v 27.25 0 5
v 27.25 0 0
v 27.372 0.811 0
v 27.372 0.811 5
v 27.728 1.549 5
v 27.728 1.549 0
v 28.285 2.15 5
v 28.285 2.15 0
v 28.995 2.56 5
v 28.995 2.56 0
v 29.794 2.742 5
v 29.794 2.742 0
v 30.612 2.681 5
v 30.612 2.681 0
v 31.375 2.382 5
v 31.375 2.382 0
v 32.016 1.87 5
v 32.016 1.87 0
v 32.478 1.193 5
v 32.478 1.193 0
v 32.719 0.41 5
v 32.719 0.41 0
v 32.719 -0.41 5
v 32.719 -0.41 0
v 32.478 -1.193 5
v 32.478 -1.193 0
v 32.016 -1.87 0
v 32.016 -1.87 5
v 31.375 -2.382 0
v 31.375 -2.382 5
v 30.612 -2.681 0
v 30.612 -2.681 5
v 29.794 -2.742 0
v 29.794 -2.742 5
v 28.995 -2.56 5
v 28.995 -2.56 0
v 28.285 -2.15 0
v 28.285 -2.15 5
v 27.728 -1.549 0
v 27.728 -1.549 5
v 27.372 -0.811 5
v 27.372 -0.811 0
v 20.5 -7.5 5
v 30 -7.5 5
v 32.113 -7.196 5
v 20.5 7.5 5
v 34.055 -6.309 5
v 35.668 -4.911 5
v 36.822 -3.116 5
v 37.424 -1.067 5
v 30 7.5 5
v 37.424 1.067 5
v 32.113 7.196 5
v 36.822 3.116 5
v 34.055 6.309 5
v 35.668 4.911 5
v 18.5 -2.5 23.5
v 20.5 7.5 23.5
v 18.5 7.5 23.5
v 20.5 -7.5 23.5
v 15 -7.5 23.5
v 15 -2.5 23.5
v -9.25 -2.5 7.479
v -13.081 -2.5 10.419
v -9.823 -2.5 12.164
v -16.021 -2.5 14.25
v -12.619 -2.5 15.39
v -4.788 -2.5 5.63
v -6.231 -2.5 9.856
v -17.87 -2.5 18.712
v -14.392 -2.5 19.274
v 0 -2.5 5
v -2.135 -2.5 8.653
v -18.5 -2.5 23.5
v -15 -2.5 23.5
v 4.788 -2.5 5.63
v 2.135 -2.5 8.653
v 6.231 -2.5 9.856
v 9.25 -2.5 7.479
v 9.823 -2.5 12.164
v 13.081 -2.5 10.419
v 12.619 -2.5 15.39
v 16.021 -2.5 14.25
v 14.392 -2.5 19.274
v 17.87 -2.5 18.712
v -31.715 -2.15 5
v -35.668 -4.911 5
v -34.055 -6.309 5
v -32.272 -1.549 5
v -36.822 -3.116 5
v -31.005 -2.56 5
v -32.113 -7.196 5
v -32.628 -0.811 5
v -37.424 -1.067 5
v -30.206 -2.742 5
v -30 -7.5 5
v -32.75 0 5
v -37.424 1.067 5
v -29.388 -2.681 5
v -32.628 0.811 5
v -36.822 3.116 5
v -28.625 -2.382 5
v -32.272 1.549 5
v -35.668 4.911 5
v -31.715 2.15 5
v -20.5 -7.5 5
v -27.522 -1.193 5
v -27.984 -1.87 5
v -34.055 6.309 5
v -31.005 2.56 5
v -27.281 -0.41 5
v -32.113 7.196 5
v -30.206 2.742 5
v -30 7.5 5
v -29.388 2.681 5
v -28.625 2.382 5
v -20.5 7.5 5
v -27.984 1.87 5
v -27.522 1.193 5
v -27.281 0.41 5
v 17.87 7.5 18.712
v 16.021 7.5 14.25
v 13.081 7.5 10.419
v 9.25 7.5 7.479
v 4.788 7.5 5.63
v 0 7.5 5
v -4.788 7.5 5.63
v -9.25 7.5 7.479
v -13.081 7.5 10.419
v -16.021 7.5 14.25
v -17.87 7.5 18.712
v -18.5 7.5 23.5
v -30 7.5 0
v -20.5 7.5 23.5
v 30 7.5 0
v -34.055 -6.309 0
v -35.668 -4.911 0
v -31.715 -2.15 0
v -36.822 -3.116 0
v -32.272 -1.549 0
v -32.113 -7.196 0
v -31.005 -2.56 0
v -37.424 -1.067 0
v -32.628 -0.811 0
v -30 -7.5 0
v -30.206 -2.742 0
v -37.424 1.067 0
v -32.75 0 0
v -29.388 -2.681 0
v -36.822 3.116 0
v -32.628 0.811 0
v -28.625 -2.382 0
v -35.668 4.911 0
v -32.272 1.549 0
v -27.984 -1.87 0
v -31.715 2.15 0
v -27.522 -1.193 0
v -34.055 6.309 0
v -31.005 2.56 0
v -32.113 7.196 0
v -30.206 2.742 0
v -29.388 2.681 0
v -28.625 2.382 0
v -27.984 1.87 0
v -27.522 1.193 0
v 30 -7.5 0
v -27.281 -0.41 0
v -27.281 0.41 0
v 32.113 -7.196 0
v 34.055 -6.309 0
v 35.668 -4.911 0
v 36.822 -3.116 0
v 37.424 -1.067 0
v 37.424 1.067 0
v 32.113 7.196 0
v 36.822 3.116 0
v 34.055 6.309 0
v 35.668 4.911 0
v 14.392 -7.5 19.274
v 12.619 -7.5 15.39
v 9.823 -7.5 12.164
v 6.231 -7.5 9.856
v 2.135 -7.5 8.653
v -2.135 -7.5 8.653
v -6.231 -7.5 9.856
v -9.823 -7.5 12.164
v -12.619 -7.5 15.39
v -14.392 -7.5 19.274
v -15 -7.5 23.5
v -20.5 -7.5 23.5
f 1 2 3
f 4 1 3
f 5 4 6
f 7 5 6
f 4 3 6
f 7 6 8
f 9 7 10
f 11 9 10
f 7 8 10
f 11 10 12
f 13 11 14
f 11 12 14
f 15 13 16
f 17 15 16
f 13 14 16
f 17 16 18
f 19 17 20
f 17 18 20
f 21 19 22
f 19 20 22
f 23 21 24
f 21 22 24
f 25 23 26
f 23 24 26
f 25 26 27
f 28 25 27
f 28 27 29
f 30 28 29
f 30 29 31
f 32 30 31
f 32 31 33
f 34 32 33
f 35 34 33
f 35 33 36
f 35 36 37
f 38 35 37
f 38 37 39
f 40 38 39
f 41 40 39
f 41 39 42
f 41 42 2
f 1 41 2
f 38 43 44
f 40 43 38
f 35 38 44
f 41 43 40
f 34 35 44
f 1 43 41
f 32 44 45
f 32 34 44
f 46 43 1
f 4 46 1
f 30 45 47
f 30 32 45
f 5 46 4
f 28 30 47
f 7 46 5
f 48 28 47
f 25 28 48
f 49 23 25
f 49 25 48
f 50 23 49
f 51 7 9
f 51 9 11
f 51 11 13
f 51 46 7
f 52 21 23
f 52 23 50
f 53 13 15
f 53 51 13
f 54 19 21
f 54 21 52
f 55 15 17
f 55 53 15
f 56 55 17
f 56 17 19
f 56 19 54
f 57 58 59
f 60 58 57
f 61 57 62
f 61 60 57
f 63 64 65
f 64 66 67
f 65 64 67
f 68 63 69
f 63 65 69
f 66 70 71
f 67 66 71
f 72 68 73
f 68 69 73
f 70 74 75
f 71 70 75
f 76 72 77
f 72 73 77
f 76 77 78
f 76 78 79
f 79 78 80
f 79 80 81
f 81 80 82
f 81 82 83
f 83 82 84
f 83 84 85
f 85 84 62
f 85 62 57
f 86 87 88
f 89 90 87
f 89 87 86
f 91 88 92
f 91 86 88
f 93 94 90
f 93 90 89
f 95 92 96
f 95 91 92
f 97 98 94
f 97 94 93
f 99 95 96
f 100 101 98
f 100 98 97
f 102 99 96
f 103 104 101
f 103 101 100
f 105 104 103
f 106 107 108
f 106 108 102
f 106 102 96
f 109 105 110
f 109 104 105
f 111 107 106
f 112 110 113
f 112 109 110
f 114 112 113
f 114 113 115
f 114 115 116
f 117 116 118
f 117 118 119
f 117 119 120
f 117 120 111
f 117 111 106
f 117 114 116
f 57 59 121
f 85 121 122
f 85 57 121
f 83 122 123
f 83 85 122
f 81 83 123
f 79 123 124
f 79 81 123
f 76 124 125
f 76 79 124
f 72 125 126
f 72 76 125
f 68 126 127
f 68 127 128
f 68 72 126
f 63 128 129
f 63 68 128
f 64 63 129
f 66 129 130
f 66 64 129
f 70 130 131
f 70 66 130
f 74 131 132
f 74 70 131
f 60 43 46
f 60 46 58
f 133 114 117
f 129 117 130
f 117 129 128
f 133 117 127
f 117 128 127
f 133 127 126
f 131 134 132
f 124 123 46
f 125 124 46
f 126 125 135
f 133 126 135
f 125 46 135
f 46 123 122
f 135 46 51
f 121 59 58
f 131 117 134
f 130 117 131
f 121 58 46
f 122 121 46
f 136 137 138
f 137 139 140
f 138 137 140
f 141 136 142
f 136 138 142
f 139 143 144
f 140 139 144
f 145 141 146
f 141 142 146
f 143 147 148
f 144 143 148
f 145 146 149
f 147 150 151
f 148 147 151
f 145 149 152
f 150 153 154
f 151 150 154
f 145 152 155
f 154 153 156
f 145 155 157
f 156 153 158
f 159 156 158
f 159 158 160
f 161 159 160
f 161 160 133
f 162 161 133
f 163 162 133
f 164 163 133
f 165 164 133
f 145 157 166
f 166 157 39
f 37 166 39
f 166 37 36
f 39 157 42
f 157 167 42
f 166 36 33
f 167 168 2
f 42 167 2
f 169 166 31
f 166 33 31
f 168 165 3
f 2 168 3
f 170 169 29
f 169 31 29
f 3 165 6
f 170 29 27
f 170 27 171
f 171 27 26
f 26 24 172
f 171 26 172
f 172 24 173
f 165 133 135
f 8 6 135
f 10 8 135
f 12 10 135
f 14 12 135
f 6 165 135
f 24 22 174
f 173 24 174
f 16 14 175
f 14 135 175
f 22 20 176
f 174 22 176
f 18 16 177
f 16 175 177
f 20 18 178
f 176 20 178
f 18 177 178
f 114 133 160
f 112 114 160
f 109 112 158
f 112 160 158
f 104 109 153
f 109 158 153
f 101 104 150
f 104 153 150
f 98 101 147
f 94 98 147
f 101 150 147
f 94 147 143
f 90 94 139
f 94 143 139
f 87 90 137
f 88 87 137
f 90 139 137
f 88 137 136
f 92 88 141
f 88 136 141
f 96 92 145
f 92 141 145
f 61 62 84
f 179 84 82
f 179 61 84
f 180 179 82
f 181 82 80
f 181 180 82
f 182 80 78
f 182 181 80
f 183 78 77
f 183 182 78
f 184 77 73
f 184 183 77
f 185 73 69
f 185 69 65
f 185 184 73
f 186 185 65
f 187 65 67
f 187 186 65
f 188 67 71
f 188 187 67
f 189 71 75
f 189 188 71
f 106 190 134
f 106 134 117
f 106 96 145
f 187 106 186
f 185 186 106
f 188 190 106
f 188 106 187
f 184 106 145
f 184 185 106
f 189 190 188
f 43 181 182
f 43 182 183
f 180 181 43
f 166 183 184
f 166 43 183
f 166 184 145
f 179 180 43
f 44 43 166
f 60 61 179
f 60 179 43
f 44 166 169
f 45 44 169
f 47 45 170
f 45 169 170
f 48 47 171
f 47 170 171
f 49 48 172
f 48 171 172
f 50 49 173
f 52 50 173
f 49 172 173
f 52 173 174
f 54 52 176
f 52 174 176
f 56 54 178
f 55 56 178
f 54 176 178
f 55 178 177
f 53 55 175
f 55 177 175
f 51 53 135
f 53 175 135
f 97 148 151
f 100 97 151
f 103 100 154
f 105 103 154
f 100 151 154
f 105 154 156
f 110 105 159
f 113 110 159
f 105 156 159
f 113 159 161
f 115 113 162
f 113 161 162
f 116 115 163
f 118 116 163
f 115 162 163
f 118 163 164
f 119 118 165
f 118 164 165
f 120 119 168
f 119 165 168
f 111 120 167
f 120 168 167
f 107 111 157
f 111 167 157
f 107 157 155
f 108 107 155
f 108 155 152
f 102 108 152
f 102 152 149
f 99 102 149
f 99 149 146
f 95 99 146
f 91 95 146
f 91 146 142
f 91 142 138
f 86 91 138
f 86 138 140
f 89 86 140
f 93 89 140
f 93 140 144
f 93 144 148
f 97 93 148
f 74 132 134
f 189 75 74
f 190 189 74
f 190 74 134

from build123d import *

# Parameters (mm, degrees)
F0_W     = 60
F0_H     = 15
F1_DEPTH = 5
F3_DEPTH = 15
F4_DEPTH = 5
F6_D     = 5.5


with BuildPart() as f1:
    # F0 (on Top) → F1 (new body)
    with BuildSketch(Plane.XY):
        Rectangle(F0_W, F0_H)
        with BuildLine():
            Line((-30, -7.5), (-30, 7.5))
            ThreePointArc((-30, 7.5), (-37.5, 0), (-30, -7.5))
        make_face()
        with BuildLine():
            ThreePointArc((30, -7.5), (37.5, 0), (30, 7.5))
            Line((30, 7.5), (30, -7.5))
        make_face()
    extrude(amount=F1_DEPTH)

    # F2 (on face) → F3 (join)
    with BuildSketch(Plane.XZ.offset(7.5)):
        with BuildLine():
            Line((20.5, 23.5), (18.5, 23.5))
            ThreePointArc((18.5, 23.5), (13.0814754325, 10.4185245286), (-5.51e-08, 5))
            Line((-5.51e-08, 5), (8.8317608663, 5))
            ThreePointArc((8.8317608663, 5), (17.3392776343, 12.5638466031), (20.5, 23.5))
        make_face()
        with BuildLine():
            ThreePointArc((-5.51e-08, 5), (-13.0814754714, 10.4185245675), (-18.5, 23.5))
            Line((-18.5, 23.5), (-20.5, 23.5))
            ThreePointArc((-20.5, 23.5), (-17.3392776343, 12.5638466031), (-8.8317608663, 5))
            Line((-8.8317608663, 5), (-5.51e-08, 5))
        make_face()
        with BuildLine():
            Line((20.5, 5), (20.5, 23.5))
            ThreePointArc((20.5, 23.5), (17.3392776343, 12.5638466031), (8.8317608663, 5))
            Line((8.8317608663, 5), (20.5, 5))
        make_face()
        with BuildLine():
            ThreePointArc((-8.8317608663, 5), (-17.3392776343, 12.5638466031), (-20.5, 23.5))
            Line((-20.5, 23.5), (-20.5, 5))
            Line((-20.5, 5), (-8.8317608663, 5))
        make_face()
    extrude(amount=-F3_DEPTH)

    # F2 (on face) → F4 (join)
    with BuildSketch(Plane.XZ.offset(7.5)):
        with BuildLine():
            ThreePointArc((-5.51e-08, 5), (13.0814754325, 10.4185245286), (18.5, 23.5))
            Line((18.5, 23.5), (15, 23.5))
            ThreePointArc((15, 23.5), (0, 8.5), (-15, 23.5))
            Line((-15, 23.5), (-18.5, 23.5))
            ThreePointArc((-18.5, 23.5), (-13.0814754714, 10.4185245675), (-5.51e-08, 5))
        make_face()
    extrude(amount=-F4_DEPTH)

    # F6 (through all)
    with Locations(Plane.XY.offset(5)):
        with Locations((30, 0), (-30, 0)):
            Hole(F6_D / 2)


solid = f1.part
